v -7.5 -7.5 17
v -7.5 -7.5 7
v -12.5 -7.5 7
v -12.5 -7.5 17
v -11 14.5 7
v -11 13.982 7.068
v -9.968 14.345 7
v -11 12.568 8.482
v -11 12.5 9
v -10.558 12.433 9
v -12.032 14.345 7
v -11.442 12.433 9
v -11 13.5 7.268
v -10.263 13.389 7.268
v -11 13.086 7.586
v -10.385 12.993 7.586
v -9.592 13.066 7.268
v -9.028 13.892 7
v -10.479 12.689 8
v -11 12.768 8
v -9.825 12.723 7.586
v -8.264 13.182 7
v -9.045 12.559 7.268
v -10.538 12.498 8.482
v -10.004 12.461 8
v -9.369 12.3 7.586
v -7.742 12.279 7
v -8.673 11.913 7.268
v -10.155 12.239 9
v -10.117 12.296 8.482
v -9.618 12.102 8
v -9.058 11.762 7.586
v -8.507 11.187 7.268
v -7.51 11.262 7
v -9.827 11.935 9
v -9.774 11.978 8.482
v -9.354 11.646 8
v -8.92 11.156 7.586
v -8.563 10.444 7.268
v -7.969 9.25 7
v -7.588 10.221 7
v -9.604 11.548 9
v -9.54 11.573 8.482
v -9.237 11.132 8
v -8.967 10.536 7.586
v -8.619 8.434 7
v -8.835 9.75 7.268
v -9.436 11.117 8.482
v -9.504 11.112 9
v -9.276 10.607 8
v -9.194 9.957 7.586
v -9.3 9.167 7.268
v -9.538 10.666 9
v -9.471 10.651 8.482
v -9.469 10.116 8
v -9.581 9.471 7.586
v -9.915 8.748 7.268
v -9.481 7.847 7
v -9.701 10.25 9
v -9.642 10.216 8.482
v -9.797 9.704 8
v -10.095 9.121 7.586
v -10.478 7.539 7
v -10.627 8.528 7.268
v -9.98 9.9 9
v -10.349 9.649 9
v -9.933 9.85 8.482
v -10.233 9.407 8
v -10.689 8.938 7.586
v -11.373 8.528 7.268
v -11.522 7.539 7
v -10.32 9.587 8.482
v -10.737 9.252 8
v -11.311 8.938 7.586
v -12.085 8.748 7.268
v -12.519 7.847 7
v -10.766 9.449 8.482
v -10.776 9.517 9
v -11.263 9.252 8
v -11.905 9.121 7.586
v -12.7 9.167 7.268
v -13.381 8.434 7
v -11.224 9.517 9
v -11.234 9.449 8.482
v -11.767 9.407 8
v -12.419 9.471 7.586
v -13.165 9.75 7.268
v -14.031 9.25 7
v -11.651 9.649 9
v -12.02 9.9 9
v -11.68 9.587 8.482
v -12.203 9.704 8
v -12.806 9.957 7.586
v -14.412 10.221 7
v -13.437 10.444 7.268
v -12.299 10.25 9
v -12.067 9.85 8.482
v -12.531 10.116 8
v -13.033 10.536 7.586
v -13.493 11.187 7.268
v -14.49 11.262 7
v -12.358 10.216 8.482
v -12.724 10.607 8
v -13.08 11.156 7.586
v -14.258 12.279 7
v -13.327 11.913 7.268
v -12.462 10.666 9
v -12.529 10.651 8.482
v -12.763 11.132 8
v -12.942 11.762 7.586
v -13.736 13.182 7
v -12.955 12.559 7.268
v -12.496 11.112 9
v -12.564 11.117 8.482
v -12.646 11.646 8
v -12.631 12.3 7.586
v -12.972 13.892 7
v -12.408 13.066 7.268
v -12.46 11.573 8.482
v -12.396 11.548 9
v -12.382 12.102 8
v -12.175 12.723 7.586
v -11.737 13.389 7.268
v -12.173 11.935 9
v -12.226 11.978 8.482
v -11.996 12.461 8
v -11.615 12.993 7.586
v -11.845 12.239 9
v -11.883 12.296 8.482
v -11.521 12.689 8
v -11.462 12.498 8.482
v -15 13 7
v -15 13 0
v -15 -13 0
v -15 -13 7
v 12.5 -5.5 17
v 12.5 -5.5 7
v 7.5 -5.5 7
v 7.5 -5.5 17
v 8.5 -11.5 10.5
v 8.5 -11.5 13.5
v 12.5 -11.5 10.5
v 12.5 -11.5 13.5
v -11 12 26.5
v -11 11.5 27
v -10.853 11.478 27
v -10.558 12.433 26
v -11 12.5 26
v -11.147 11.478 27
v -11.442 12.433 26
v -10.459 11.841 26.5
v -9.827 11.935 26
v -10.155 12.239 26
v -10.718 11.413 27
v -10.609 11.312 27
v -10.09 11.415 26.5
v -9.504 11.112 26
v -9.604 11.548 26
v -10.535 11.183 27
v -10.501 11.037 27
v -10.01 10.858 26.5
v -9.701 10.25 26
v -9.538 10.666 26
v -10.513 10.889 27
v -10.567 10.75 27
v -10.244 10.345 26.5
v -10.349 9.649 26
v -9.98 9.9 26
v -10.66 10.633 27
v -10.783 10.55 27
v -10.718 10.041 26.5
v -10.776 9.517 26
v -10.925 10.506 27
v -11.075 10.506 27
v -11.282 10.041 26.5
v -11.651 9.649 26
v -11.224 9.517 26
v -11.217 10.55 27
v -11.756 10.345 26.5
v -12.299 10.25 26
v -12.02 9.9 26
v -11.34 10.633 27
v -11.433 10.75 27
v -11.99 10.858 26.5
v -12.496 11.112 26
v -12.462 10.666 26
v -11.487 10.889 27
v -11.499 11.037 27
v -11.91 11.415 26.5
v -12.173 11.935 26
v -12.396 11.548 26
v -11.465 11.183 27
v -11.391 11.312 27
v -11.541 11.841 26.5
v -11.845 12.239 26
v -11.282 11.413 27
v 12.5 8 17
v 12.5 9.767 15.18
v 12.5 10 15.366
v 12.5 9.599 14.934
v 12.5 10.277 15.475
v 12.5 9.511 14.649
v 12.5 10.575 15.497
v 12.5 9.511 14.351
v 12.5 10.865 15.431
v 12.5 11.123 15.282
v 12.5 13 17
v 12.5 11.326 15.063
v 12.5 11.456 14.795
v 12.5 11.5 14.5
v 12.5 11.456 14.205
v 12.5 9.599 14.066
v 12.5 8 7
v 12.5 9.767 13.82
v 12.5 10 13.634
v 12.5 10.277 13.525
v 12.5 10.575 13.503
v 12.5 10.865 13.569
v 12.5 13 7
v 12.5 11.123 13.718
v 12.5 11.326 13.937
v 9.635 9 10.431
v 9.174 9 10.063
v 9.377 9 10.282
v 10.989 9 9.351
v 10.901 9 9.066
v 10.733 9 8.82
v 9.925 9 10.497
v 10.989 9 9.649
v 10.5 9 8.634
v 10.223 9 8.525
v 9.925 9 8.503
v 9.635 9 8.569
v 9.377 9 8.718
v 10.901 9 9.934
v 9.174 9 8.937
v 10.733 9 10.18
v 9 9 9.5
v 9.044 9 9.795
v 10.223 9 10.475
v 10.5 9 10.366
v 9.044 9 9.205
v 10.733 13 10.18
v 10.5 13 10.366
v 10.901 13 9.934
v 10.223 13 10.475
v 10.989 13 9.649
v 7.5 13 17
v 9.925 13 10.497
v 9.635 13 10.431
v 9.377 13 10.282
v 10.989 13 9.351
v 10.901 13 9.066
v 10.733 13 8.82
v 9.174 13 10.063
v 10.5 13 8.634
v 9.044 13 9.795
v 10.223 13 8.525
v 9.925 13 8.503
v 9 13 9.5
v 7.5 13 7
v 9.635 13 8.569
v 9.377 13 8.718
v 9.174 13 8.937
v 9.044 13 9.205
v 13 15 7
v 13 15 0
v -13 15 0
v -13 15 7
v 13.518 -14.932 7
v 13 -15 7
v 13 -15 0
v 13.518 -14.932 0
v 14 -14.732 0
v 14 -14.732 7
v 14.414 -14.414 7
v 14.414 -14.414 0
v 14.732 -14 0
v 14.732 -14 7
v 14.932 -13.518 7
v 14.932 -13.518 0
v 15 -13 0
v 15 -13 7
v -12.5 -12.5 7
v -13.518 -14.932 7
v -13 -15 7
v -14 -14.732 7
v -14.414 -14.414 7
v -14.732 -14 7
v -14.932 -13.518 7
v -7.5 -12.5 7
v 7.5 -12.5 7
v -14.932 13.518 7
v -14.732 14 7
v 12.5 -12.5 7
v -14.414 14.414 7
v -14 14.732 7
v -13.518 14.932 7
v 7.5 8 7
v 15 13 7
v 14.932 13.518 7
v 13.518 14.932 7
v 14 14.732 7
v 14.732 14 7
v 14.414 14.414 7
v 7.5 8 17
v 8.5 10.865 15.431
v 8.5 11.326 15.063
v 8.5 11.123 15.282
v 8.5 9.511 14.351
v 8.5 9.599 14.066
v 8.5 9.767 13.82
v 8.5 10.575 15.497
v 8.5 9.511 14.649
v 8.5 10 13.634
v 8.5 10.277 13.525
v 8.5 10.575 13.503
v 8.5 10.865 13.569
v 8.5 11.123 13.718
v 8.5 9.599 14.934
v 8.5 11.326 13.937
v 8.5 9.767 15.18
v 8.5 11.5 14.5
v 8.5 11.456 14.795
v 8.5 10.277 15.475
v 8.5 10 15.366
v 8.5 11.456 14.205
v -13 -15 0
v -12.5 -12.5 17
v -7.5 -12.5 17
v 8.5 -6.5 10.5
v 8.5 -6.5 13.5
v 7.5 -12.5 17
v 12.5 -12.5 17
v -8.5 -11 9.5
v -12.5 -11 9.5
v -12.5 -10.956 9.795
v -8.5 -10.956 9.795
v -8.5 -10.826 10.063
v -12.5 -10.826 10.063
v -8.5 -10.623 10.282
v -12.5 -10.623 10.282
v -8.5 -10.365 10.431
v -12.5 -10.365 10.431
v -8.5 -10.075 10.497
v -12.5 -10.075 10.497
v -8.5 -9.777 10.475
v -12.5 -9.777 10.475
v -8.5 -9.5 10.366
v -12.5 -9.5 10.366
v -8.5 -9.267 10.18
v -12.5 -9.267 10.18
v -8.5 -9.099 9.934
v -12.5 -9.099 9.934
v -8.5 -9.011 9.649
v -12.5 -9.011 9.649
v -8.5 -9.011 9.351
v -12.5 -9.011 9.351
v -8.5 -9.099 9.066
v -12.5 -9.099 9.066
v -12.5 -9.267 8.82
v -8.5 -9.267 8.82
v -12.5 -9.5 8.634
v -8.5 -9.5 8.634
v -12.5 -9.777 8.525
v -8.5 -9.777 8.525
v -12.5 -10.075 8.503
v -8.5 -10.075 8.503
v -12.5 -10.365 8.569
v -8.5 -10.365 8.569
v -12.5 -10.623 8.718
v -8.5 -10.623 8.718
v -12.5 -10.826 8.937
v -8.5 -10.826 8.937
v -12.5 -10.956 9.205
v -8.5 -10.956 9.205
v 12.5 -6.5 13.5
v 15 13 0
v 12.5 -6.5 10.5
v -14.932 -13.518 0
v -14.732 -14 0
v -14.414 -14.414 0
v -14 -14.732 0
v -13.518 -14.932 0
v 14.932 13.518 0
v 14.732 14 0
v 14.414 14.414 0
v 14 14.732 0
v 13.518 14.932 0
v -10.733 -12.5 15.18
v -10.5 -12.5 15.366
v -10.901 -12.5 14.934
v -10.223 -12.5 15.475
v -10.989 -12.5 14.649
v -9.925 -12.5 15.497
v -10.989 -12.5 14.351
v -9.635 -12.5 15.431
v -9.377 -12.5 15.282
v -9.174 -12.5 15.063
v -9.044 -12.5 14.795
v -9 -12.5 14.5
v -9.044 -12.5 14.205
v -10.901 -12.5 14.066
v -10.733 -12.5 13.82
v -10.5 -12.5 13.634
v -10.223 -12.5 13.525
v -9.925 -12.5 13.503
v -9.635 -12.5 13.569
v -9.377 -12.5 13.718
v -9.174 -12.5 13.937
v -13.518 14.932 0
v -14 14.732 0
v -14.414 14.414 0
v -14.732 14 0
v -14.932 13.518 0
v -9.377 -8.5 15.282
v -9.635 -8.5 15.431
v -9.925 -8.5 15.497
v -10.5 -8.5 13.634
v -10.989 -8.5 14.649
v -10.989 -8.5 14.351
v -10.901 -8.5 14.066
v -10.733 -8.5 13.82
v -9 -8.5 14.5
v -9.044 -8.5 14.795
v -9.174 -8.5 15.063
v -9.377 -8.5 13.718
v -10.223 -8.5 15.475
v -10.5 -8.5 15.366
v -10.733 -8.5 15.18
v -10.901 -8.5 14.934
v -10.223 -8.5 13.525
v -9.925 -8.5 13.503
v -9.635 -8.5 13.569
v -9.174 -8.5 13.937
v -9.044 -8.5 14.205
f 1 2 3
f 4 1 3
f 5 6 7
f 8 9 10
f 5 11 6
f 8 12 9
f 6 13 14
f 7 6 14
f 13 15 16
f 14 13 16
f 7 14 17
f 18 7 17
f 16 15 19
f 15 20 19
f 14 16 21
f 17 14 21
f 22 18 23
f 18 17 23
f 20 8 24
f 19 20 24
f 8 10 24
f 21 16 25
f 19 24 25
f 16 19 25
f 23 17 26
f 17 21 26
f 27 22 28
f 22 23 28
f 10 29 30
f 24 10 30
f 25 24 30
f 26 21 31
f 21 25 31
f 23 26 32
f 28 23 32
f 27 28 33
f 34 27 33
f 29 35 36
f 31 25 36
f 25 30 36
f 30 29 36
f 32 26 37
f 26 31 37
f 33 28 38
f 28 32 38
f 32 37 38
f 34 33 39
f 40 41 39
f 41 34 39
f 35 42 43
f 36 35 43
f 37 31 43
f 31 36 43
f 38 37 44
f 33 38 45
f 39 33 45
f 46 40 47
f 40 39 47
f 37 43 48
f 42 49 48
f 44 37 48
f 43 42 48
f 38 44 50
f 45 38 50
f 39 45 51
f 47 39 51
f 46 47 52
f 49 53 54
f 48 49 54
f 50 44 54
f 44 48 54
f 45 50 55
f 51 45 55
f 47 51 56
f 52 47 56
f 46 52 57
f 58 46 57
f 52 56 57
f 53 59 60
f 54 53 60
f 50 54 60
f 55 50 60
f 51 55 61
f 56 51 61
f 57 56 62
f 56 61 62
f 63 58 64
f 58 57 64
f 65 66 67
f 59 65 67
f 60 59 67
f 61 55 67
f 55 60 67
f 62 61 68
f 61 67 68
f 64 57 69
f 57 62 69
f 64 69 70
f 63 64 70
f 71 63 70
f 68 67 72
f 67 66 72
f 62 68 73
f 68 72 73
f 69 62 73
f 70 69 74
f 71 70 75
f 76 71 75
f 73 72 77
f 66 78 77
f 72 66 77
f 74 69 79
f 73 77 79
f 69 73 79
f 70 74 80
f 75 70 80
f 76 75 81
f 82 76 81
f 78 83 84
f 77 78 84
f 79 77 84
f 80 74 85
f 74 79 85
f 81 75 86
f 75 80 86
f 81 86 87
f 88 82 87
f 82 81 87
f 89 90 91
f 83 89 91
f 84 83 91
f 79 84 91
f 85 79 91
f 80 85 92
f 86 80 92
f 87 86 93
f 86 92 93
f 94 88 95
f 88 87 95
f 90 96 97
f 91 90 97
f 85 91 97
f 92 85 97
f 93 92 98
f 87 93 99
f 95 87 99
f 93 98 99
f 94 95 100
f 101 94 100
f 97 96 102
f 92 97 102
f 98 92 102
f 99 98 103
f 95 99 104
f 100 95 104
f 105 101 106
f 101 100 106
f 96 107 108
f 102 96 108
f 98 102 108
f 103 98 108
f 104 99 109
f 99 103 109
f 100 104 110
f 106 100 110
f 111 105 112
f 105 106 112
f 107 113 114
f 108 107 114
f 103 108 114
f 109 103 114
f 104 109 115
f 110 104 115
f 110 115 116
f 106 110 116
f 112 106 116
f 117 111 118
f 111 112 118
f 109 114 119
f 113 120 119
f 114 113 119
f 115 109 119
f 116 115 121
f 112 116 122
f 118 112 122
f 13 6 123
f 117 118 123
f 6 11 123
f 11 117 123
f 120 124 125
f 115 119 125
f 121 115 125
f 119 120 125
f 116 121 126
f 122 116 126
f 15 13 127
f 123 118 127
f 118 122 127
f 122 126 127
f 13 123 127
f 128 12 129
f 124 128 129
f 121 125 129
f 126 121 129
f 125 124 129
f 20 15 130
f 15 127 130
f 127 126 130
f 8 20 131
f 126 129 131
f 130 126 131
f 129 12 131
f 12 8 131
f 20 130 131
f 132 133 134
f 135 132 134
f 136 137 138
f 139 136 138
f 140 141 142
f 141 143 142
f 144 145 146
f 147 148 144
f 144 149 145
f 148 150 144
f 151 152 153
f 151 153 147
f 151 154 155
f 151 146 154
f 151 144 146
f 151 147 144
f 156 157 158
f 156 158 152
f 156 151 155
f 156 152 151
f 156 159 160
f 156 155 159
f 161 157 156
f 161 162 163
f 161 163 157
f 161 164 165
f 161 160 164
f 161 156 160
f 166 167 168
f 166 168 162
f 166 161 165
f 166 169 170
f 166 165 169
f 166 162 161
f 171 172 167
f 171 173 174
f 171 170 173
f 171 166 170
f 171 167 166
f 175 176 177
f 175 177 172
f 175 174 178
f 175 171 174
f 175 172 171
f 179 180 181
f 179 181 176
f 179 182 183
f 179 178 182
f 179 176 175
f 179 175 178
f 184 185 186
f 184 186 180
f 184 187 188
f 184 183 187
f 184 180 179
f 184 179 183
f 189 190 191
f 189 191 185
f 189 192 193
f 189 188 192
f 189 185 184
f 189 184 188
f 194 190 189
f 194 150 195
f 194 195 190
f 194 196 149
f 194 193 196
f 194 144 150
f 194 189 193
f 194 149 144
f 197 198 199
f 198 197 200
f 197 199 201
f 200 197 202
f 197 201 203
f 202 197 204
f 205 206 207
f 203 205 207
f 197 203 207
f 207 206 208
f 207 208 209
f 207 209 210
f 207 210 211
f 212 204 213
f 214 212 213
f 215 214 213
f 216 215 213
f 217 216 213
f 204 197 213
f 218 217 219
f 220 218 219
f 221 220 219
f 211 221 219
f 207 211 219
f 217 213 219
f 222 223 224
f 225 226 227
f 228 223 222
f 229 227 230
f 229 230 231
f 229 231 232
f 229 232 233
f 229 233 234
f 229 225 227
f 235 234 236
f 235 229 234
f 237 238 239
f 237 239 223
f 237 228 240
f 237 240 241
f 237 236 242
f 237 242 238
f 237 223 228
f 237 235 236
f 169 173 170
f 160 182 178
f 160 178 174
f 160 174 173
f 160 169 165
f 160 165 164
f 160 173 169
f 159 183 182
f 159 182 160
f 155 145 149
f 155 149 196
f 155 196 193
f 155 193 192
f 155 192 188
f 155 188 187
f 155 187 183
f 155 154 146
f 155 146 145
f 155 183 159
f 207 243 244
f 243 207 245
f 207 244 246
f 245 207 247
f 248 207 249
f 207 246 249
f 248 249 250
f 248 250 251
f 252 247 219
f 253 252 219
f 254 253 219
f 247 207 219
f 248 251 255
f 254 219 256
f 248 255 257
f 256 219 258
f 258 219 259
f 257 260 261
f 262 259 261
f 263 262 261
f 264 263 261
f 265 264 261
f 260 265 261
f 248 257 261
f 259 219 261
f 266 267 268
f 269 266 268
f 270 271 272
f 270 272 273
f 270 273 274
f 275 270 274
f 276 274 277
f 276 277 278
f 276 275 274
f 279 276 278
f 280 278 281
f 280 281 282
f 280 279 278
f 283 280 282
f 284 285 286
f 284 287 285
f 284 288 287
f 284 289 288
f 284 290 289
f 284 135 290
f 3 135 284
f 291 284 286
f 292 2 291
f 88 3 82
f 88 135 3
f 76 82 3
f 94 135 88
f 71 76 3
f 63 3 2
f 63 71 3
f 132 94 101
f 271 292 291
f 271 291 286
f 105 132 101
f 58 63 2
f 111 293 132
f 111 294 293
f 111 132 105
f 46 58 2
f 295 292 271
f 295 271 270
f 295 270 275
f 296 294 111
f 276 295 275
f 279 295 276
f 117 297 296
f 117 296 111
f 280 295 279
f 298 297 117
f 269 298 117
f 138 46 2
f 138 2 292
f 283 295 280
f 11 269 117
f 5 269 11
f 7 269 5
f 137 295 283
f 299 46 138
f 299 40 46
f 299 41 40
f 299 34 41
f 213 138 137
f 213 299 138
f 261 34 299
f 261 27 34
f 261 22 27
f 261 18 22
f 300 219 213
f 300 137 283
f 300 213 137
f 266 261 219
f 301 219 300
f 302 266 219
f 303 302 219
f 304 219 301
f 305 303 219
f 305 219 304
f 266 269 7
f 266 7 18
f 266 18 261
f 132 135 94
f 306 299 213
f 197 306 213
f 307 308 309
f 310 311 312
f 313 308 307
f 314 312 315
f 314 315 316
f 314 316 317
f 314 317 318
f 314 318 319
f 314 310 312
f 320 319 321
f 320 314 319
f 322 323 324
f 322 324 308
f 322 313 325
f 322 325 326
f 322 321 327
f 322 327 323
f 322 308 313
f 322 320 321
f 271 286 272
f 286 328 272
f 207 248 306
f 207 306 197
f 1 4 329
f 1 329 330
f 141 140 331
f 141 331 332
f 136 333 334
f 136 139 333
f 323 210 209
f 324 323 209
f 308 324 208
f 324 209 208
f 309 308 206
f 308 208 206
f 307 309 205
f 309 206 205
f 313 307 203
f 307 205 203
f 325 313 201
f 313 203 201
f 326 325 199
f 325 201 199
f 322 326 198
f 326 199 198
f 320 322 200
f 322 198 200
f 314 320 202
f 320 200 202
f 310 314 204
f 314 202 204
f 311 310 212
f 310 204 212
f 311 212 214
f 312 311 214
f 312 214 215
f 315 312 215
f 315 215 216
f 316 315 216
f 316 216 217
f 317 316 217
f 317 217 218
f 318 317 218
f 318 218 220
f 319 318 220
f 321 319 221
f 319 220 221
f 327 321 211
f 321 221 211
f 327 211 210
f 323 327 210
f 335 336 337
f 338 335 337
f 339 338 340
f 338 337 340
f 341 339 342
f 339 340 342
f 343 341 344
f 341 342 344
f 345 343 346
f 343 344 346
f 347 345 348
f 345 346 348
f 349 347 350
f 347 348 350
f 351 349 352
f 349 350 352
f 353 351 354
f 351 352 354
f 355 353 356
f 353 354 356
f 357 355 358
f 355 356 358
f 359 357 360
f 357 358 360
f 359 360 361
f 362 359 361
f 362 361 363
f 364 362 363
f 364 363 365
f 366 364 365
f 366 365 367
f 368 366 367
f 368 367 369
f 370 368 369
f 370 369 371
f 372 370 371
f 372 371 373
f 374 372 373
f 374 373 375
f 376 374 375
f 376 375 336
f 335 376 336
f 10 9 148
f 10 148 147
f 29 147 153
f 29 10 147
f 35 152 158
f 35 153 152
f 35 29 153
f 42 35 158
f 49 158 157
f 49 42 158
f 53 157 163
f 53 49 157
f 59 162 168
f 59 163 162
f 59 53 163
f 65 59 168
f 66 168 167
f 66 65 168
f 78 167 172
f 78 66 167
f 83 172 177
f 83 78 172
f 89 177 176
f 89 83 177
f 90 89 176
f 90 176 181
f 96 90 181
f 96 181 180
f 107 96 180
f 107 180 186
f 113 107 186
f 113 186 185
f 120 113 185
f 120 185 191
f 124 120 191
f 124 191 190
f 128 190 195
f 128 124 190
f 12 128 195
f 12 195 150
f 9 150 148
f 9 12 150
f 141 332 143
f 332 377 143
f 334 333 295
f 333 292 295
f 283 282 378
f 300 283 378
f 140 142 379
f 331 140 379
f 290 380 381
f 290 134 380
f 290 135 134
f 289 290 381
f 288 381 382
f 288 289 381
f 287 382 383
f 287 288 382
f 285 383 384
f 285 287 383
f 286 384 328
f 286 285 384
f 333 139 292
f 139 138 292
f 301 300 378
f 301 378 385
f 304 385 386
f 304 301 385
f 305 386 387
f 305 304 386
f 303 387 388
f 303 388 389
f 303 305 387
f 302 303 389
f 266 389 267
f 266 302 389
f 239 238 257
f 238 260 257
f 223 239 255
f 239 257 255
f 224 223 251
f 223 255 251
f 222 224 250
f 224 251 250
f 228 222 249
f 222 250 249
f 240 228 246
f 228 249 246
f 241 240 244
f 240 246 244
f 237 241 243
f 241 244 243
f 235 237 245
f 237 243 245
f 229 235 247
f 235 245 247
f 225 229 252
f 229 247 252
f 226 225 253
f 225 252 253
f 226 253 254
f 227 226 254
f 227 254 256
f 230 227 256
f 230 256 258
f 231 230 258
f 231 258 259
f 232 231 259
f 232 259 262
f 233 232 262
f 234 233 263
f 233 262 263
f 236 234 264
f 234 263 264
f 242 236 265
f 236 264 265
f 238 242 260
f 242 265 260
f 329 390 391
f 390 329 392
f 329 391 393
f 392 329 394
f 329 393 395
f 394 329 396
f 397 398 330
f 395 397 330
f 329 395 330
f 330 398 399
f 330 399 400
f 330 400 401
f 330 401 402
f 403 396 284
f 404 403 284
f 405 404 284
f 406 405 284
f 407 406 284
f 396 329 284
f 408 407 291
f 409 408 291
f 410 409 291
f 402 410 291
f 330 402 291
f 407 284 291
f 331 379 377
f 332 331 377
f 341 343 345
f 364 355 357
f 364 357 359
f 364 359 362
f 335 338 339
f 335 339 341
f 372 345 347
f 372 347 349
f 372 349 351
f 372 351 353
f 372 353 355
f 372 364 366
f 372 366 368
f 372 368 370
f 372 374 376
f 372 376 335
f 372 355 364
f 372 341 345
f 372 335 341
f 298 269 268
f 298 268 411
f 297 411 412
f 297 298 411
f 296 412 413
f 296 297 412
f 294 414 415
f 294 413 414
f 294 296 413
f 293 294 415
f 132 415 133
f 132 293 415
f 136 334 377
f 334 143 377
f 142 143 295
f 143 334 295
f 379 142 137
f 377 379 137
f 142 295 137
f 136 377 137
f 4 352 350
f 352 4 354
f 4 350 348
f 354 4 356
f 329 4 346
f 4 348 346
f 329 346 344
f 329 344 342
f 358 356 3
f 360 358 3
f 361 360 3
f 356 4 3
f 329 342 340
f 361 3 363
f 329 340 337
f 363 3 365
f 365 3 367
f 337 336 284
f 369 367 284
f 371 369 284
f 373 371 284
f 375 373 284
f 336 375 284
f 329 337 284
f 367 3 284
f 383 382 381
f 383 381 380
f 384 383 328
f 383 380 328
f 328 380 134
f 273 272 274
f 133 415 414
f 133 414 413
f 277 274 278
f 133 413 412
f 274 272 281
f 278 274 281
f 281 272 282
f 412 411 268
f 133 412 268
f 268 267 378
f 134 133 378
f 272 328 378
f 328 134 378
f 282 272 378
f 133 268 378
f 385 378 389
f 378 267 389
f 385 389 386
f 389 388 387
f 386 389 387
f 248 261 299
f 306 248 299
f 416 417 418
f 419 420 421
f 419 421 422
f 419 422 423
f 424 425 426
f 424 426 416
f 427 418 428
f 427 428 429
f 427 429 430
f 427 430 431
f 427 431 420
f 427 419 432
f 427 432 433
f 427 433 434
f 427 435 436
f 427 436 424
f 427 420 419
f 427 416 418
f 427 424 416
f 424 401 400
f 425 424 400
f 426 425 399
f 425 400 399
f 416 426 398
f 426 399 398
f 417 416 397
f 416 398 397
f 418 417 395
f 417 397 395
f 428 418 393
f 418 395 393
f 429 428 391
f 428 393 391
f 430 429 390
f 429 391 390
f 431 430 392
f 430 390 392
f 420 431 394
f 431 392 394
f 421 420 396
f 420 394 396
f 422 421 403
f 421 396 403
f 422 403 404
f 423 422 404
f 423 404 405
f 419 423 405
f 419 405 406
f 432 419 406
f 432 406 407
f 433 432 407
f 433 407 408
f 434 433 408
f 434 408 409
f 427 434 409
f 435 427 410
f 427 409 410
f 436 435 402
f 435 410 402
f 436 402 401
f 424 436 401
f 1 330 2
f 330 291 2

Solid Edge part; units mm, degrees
sketch "Sketch1" plane through (0, 0, 0) normal (0, 0, 1) x (1, 0, 0)
  line L0 (-15, -15) -> (15, -15)
  line L1 (15, -15) -> (15, 15)
  line L2 (15, 15) -> (-15, 15)
  line L3 (-15, 15) -> (-15, -15)
  dimension "D1" = 30
  dimension "D2" = 30
extrude "Protrusion1" add sketch "Sketch1" along normal blind 7
sketch "Sketch2" plane through (0, 0, 7) normal (0, 0, 1) x (0, 1, 0)
  circle A0 centre (11, 11) radius 1.5
  dimension "D1" = 3
  dimension "D2" = 4
  dimension "D3" = 4
extrude "Antenna" add sketch "Sketch2" along normal blind 20
fillet "Rotondo_1" radius 2 4 edges at (-15, 15, 3.5) (-15, -15, 3.5) (15, 15, 3.5) (15, -15, 3.5)
fillet "Rotondo_2" radius 2 1 edges at (-11, 9.5, 7)
chamfer "Smusso_1" distance 1 angle 45 1 edges at (-11, 9.5, 27)
sketch "Sketch3" plane through (0, 0, 7) normal (0, 0, 1) x (0, 1, 0)
  line L0 (8, -7.5) -> (8, -12.5)
  line L1 (8, -12.5) -> (13, -12.5)
  line L2 (13, -12.5) -> (13, -7.5)
  line L3 (13, -7.5) -> (8, -7.5)
extrude "Alloggio_Motori_1" add sketch "Sketch3" along normal blind 10
sketch "Sketch4" plane through (10, 13, 9) normal (0, 1, 0) x (-1, 0, 0)
  circle A0 centre (0, 0.5) radius 1
  dimension "D1" = 2
  dimension "D2" = 2.5
extrude "ScavoEstrusione_3" cut sketch "Sketch4" against normal blind 4
sketch "Sketch5" plane through (0, 0, 7) normal (0, 0, 1) x (0, 1, 0)
  line L0 (-12.5, 7.5) -> (-7.5, 7.5)
  line L1 (-7.5, 7.5) -> (-7.5, 12.5)
  line L2 (-7.5, 12.5) -> (-12.5, 12.5)
  line L3 (-12.5, 12.5) -> (-12.5, 7.5)
  dimension "D1" = 5
  dimension "D2" = 2.5
  dimension "D3" = 2.5
extrude "Alloggio_Motori_3" add sketch "Sketch5" along normal blind 10
sketch "Sketch6" plane through (12.5, 10.5, 12) normal (1, 0, 0) x (0, 1, 0)
  circle A0 centre (0, 2.5) radius 1
  dimension "D1" = 2
  dimension "D2" = 2.5
extrude "ScavoEstrusione_9" cut sketch "Sketch6" against normal blind 4
sketch "Sketch7" plane through (-12.5, -10, 12) normal (-1, 0, 0) x (0, -1, 0)
  circle A0 centre (0, -2.5) radius 1
  dimension "D1" = 2
  dimension "D2" = 2.5
extrude "ScavoEstrusione_10" cut sketch "Sketch7" against normal blind 4
sketch "Sketch8" plane through (-10, -12.5, 12) normal (0, -1, 0) x (1, 0, 0)
  circle A0 centre (0, 2.5) radius 1
  dimension "D1" = 2
  dimension "D2" = 2.5
extrude "ScavoEstrusione_11" cut sketch "Sketch8" against normal blind 4
sketch "Sketch9" plane through (0, 0, 7) normal (0, 0, 1) x (1, 0, 0)
  line L0 (7.5, -12.5) -> (12.5, -12.5)
  line L1 (12.5, -12.5) -> (12.5, -5.5)
  line L2 (12.5, -5.5) -> (7.5, -5.5)
  line L3 (7.5, -5.5) -> (7.5, -12.5)
  dimension "D1" = 5
  dimension "D2" = 7
  dimension "D3" = 2.5
  dimension "D4" = 2.5
extrude "Alloggio_collegamento" add sketch "Sketch9" along normal blind 10
sketch "Sketch10" plane through (12.5, -9, 12) normal (1, 0, 0) x (0, 1, 0)
  line L0 (-2.5, -1.5) -> (2.5, -1.5)
  line L1 (2.5, -1.5) -> (2.5, 1.5)
  line L2 (2.5, 1.5) -> (-2.5, 1.5)
  line L3 (-2.5, 1.5) -> (-2.5, -1.5)
  dimension "D1" = 3
  dimension "D2" = 5
  dimension "D3" = 1
  dimension "D4" = 3.5
extrude "ScavoEstrusione_12" cut sketch "Sketch10" against normal blind 4
